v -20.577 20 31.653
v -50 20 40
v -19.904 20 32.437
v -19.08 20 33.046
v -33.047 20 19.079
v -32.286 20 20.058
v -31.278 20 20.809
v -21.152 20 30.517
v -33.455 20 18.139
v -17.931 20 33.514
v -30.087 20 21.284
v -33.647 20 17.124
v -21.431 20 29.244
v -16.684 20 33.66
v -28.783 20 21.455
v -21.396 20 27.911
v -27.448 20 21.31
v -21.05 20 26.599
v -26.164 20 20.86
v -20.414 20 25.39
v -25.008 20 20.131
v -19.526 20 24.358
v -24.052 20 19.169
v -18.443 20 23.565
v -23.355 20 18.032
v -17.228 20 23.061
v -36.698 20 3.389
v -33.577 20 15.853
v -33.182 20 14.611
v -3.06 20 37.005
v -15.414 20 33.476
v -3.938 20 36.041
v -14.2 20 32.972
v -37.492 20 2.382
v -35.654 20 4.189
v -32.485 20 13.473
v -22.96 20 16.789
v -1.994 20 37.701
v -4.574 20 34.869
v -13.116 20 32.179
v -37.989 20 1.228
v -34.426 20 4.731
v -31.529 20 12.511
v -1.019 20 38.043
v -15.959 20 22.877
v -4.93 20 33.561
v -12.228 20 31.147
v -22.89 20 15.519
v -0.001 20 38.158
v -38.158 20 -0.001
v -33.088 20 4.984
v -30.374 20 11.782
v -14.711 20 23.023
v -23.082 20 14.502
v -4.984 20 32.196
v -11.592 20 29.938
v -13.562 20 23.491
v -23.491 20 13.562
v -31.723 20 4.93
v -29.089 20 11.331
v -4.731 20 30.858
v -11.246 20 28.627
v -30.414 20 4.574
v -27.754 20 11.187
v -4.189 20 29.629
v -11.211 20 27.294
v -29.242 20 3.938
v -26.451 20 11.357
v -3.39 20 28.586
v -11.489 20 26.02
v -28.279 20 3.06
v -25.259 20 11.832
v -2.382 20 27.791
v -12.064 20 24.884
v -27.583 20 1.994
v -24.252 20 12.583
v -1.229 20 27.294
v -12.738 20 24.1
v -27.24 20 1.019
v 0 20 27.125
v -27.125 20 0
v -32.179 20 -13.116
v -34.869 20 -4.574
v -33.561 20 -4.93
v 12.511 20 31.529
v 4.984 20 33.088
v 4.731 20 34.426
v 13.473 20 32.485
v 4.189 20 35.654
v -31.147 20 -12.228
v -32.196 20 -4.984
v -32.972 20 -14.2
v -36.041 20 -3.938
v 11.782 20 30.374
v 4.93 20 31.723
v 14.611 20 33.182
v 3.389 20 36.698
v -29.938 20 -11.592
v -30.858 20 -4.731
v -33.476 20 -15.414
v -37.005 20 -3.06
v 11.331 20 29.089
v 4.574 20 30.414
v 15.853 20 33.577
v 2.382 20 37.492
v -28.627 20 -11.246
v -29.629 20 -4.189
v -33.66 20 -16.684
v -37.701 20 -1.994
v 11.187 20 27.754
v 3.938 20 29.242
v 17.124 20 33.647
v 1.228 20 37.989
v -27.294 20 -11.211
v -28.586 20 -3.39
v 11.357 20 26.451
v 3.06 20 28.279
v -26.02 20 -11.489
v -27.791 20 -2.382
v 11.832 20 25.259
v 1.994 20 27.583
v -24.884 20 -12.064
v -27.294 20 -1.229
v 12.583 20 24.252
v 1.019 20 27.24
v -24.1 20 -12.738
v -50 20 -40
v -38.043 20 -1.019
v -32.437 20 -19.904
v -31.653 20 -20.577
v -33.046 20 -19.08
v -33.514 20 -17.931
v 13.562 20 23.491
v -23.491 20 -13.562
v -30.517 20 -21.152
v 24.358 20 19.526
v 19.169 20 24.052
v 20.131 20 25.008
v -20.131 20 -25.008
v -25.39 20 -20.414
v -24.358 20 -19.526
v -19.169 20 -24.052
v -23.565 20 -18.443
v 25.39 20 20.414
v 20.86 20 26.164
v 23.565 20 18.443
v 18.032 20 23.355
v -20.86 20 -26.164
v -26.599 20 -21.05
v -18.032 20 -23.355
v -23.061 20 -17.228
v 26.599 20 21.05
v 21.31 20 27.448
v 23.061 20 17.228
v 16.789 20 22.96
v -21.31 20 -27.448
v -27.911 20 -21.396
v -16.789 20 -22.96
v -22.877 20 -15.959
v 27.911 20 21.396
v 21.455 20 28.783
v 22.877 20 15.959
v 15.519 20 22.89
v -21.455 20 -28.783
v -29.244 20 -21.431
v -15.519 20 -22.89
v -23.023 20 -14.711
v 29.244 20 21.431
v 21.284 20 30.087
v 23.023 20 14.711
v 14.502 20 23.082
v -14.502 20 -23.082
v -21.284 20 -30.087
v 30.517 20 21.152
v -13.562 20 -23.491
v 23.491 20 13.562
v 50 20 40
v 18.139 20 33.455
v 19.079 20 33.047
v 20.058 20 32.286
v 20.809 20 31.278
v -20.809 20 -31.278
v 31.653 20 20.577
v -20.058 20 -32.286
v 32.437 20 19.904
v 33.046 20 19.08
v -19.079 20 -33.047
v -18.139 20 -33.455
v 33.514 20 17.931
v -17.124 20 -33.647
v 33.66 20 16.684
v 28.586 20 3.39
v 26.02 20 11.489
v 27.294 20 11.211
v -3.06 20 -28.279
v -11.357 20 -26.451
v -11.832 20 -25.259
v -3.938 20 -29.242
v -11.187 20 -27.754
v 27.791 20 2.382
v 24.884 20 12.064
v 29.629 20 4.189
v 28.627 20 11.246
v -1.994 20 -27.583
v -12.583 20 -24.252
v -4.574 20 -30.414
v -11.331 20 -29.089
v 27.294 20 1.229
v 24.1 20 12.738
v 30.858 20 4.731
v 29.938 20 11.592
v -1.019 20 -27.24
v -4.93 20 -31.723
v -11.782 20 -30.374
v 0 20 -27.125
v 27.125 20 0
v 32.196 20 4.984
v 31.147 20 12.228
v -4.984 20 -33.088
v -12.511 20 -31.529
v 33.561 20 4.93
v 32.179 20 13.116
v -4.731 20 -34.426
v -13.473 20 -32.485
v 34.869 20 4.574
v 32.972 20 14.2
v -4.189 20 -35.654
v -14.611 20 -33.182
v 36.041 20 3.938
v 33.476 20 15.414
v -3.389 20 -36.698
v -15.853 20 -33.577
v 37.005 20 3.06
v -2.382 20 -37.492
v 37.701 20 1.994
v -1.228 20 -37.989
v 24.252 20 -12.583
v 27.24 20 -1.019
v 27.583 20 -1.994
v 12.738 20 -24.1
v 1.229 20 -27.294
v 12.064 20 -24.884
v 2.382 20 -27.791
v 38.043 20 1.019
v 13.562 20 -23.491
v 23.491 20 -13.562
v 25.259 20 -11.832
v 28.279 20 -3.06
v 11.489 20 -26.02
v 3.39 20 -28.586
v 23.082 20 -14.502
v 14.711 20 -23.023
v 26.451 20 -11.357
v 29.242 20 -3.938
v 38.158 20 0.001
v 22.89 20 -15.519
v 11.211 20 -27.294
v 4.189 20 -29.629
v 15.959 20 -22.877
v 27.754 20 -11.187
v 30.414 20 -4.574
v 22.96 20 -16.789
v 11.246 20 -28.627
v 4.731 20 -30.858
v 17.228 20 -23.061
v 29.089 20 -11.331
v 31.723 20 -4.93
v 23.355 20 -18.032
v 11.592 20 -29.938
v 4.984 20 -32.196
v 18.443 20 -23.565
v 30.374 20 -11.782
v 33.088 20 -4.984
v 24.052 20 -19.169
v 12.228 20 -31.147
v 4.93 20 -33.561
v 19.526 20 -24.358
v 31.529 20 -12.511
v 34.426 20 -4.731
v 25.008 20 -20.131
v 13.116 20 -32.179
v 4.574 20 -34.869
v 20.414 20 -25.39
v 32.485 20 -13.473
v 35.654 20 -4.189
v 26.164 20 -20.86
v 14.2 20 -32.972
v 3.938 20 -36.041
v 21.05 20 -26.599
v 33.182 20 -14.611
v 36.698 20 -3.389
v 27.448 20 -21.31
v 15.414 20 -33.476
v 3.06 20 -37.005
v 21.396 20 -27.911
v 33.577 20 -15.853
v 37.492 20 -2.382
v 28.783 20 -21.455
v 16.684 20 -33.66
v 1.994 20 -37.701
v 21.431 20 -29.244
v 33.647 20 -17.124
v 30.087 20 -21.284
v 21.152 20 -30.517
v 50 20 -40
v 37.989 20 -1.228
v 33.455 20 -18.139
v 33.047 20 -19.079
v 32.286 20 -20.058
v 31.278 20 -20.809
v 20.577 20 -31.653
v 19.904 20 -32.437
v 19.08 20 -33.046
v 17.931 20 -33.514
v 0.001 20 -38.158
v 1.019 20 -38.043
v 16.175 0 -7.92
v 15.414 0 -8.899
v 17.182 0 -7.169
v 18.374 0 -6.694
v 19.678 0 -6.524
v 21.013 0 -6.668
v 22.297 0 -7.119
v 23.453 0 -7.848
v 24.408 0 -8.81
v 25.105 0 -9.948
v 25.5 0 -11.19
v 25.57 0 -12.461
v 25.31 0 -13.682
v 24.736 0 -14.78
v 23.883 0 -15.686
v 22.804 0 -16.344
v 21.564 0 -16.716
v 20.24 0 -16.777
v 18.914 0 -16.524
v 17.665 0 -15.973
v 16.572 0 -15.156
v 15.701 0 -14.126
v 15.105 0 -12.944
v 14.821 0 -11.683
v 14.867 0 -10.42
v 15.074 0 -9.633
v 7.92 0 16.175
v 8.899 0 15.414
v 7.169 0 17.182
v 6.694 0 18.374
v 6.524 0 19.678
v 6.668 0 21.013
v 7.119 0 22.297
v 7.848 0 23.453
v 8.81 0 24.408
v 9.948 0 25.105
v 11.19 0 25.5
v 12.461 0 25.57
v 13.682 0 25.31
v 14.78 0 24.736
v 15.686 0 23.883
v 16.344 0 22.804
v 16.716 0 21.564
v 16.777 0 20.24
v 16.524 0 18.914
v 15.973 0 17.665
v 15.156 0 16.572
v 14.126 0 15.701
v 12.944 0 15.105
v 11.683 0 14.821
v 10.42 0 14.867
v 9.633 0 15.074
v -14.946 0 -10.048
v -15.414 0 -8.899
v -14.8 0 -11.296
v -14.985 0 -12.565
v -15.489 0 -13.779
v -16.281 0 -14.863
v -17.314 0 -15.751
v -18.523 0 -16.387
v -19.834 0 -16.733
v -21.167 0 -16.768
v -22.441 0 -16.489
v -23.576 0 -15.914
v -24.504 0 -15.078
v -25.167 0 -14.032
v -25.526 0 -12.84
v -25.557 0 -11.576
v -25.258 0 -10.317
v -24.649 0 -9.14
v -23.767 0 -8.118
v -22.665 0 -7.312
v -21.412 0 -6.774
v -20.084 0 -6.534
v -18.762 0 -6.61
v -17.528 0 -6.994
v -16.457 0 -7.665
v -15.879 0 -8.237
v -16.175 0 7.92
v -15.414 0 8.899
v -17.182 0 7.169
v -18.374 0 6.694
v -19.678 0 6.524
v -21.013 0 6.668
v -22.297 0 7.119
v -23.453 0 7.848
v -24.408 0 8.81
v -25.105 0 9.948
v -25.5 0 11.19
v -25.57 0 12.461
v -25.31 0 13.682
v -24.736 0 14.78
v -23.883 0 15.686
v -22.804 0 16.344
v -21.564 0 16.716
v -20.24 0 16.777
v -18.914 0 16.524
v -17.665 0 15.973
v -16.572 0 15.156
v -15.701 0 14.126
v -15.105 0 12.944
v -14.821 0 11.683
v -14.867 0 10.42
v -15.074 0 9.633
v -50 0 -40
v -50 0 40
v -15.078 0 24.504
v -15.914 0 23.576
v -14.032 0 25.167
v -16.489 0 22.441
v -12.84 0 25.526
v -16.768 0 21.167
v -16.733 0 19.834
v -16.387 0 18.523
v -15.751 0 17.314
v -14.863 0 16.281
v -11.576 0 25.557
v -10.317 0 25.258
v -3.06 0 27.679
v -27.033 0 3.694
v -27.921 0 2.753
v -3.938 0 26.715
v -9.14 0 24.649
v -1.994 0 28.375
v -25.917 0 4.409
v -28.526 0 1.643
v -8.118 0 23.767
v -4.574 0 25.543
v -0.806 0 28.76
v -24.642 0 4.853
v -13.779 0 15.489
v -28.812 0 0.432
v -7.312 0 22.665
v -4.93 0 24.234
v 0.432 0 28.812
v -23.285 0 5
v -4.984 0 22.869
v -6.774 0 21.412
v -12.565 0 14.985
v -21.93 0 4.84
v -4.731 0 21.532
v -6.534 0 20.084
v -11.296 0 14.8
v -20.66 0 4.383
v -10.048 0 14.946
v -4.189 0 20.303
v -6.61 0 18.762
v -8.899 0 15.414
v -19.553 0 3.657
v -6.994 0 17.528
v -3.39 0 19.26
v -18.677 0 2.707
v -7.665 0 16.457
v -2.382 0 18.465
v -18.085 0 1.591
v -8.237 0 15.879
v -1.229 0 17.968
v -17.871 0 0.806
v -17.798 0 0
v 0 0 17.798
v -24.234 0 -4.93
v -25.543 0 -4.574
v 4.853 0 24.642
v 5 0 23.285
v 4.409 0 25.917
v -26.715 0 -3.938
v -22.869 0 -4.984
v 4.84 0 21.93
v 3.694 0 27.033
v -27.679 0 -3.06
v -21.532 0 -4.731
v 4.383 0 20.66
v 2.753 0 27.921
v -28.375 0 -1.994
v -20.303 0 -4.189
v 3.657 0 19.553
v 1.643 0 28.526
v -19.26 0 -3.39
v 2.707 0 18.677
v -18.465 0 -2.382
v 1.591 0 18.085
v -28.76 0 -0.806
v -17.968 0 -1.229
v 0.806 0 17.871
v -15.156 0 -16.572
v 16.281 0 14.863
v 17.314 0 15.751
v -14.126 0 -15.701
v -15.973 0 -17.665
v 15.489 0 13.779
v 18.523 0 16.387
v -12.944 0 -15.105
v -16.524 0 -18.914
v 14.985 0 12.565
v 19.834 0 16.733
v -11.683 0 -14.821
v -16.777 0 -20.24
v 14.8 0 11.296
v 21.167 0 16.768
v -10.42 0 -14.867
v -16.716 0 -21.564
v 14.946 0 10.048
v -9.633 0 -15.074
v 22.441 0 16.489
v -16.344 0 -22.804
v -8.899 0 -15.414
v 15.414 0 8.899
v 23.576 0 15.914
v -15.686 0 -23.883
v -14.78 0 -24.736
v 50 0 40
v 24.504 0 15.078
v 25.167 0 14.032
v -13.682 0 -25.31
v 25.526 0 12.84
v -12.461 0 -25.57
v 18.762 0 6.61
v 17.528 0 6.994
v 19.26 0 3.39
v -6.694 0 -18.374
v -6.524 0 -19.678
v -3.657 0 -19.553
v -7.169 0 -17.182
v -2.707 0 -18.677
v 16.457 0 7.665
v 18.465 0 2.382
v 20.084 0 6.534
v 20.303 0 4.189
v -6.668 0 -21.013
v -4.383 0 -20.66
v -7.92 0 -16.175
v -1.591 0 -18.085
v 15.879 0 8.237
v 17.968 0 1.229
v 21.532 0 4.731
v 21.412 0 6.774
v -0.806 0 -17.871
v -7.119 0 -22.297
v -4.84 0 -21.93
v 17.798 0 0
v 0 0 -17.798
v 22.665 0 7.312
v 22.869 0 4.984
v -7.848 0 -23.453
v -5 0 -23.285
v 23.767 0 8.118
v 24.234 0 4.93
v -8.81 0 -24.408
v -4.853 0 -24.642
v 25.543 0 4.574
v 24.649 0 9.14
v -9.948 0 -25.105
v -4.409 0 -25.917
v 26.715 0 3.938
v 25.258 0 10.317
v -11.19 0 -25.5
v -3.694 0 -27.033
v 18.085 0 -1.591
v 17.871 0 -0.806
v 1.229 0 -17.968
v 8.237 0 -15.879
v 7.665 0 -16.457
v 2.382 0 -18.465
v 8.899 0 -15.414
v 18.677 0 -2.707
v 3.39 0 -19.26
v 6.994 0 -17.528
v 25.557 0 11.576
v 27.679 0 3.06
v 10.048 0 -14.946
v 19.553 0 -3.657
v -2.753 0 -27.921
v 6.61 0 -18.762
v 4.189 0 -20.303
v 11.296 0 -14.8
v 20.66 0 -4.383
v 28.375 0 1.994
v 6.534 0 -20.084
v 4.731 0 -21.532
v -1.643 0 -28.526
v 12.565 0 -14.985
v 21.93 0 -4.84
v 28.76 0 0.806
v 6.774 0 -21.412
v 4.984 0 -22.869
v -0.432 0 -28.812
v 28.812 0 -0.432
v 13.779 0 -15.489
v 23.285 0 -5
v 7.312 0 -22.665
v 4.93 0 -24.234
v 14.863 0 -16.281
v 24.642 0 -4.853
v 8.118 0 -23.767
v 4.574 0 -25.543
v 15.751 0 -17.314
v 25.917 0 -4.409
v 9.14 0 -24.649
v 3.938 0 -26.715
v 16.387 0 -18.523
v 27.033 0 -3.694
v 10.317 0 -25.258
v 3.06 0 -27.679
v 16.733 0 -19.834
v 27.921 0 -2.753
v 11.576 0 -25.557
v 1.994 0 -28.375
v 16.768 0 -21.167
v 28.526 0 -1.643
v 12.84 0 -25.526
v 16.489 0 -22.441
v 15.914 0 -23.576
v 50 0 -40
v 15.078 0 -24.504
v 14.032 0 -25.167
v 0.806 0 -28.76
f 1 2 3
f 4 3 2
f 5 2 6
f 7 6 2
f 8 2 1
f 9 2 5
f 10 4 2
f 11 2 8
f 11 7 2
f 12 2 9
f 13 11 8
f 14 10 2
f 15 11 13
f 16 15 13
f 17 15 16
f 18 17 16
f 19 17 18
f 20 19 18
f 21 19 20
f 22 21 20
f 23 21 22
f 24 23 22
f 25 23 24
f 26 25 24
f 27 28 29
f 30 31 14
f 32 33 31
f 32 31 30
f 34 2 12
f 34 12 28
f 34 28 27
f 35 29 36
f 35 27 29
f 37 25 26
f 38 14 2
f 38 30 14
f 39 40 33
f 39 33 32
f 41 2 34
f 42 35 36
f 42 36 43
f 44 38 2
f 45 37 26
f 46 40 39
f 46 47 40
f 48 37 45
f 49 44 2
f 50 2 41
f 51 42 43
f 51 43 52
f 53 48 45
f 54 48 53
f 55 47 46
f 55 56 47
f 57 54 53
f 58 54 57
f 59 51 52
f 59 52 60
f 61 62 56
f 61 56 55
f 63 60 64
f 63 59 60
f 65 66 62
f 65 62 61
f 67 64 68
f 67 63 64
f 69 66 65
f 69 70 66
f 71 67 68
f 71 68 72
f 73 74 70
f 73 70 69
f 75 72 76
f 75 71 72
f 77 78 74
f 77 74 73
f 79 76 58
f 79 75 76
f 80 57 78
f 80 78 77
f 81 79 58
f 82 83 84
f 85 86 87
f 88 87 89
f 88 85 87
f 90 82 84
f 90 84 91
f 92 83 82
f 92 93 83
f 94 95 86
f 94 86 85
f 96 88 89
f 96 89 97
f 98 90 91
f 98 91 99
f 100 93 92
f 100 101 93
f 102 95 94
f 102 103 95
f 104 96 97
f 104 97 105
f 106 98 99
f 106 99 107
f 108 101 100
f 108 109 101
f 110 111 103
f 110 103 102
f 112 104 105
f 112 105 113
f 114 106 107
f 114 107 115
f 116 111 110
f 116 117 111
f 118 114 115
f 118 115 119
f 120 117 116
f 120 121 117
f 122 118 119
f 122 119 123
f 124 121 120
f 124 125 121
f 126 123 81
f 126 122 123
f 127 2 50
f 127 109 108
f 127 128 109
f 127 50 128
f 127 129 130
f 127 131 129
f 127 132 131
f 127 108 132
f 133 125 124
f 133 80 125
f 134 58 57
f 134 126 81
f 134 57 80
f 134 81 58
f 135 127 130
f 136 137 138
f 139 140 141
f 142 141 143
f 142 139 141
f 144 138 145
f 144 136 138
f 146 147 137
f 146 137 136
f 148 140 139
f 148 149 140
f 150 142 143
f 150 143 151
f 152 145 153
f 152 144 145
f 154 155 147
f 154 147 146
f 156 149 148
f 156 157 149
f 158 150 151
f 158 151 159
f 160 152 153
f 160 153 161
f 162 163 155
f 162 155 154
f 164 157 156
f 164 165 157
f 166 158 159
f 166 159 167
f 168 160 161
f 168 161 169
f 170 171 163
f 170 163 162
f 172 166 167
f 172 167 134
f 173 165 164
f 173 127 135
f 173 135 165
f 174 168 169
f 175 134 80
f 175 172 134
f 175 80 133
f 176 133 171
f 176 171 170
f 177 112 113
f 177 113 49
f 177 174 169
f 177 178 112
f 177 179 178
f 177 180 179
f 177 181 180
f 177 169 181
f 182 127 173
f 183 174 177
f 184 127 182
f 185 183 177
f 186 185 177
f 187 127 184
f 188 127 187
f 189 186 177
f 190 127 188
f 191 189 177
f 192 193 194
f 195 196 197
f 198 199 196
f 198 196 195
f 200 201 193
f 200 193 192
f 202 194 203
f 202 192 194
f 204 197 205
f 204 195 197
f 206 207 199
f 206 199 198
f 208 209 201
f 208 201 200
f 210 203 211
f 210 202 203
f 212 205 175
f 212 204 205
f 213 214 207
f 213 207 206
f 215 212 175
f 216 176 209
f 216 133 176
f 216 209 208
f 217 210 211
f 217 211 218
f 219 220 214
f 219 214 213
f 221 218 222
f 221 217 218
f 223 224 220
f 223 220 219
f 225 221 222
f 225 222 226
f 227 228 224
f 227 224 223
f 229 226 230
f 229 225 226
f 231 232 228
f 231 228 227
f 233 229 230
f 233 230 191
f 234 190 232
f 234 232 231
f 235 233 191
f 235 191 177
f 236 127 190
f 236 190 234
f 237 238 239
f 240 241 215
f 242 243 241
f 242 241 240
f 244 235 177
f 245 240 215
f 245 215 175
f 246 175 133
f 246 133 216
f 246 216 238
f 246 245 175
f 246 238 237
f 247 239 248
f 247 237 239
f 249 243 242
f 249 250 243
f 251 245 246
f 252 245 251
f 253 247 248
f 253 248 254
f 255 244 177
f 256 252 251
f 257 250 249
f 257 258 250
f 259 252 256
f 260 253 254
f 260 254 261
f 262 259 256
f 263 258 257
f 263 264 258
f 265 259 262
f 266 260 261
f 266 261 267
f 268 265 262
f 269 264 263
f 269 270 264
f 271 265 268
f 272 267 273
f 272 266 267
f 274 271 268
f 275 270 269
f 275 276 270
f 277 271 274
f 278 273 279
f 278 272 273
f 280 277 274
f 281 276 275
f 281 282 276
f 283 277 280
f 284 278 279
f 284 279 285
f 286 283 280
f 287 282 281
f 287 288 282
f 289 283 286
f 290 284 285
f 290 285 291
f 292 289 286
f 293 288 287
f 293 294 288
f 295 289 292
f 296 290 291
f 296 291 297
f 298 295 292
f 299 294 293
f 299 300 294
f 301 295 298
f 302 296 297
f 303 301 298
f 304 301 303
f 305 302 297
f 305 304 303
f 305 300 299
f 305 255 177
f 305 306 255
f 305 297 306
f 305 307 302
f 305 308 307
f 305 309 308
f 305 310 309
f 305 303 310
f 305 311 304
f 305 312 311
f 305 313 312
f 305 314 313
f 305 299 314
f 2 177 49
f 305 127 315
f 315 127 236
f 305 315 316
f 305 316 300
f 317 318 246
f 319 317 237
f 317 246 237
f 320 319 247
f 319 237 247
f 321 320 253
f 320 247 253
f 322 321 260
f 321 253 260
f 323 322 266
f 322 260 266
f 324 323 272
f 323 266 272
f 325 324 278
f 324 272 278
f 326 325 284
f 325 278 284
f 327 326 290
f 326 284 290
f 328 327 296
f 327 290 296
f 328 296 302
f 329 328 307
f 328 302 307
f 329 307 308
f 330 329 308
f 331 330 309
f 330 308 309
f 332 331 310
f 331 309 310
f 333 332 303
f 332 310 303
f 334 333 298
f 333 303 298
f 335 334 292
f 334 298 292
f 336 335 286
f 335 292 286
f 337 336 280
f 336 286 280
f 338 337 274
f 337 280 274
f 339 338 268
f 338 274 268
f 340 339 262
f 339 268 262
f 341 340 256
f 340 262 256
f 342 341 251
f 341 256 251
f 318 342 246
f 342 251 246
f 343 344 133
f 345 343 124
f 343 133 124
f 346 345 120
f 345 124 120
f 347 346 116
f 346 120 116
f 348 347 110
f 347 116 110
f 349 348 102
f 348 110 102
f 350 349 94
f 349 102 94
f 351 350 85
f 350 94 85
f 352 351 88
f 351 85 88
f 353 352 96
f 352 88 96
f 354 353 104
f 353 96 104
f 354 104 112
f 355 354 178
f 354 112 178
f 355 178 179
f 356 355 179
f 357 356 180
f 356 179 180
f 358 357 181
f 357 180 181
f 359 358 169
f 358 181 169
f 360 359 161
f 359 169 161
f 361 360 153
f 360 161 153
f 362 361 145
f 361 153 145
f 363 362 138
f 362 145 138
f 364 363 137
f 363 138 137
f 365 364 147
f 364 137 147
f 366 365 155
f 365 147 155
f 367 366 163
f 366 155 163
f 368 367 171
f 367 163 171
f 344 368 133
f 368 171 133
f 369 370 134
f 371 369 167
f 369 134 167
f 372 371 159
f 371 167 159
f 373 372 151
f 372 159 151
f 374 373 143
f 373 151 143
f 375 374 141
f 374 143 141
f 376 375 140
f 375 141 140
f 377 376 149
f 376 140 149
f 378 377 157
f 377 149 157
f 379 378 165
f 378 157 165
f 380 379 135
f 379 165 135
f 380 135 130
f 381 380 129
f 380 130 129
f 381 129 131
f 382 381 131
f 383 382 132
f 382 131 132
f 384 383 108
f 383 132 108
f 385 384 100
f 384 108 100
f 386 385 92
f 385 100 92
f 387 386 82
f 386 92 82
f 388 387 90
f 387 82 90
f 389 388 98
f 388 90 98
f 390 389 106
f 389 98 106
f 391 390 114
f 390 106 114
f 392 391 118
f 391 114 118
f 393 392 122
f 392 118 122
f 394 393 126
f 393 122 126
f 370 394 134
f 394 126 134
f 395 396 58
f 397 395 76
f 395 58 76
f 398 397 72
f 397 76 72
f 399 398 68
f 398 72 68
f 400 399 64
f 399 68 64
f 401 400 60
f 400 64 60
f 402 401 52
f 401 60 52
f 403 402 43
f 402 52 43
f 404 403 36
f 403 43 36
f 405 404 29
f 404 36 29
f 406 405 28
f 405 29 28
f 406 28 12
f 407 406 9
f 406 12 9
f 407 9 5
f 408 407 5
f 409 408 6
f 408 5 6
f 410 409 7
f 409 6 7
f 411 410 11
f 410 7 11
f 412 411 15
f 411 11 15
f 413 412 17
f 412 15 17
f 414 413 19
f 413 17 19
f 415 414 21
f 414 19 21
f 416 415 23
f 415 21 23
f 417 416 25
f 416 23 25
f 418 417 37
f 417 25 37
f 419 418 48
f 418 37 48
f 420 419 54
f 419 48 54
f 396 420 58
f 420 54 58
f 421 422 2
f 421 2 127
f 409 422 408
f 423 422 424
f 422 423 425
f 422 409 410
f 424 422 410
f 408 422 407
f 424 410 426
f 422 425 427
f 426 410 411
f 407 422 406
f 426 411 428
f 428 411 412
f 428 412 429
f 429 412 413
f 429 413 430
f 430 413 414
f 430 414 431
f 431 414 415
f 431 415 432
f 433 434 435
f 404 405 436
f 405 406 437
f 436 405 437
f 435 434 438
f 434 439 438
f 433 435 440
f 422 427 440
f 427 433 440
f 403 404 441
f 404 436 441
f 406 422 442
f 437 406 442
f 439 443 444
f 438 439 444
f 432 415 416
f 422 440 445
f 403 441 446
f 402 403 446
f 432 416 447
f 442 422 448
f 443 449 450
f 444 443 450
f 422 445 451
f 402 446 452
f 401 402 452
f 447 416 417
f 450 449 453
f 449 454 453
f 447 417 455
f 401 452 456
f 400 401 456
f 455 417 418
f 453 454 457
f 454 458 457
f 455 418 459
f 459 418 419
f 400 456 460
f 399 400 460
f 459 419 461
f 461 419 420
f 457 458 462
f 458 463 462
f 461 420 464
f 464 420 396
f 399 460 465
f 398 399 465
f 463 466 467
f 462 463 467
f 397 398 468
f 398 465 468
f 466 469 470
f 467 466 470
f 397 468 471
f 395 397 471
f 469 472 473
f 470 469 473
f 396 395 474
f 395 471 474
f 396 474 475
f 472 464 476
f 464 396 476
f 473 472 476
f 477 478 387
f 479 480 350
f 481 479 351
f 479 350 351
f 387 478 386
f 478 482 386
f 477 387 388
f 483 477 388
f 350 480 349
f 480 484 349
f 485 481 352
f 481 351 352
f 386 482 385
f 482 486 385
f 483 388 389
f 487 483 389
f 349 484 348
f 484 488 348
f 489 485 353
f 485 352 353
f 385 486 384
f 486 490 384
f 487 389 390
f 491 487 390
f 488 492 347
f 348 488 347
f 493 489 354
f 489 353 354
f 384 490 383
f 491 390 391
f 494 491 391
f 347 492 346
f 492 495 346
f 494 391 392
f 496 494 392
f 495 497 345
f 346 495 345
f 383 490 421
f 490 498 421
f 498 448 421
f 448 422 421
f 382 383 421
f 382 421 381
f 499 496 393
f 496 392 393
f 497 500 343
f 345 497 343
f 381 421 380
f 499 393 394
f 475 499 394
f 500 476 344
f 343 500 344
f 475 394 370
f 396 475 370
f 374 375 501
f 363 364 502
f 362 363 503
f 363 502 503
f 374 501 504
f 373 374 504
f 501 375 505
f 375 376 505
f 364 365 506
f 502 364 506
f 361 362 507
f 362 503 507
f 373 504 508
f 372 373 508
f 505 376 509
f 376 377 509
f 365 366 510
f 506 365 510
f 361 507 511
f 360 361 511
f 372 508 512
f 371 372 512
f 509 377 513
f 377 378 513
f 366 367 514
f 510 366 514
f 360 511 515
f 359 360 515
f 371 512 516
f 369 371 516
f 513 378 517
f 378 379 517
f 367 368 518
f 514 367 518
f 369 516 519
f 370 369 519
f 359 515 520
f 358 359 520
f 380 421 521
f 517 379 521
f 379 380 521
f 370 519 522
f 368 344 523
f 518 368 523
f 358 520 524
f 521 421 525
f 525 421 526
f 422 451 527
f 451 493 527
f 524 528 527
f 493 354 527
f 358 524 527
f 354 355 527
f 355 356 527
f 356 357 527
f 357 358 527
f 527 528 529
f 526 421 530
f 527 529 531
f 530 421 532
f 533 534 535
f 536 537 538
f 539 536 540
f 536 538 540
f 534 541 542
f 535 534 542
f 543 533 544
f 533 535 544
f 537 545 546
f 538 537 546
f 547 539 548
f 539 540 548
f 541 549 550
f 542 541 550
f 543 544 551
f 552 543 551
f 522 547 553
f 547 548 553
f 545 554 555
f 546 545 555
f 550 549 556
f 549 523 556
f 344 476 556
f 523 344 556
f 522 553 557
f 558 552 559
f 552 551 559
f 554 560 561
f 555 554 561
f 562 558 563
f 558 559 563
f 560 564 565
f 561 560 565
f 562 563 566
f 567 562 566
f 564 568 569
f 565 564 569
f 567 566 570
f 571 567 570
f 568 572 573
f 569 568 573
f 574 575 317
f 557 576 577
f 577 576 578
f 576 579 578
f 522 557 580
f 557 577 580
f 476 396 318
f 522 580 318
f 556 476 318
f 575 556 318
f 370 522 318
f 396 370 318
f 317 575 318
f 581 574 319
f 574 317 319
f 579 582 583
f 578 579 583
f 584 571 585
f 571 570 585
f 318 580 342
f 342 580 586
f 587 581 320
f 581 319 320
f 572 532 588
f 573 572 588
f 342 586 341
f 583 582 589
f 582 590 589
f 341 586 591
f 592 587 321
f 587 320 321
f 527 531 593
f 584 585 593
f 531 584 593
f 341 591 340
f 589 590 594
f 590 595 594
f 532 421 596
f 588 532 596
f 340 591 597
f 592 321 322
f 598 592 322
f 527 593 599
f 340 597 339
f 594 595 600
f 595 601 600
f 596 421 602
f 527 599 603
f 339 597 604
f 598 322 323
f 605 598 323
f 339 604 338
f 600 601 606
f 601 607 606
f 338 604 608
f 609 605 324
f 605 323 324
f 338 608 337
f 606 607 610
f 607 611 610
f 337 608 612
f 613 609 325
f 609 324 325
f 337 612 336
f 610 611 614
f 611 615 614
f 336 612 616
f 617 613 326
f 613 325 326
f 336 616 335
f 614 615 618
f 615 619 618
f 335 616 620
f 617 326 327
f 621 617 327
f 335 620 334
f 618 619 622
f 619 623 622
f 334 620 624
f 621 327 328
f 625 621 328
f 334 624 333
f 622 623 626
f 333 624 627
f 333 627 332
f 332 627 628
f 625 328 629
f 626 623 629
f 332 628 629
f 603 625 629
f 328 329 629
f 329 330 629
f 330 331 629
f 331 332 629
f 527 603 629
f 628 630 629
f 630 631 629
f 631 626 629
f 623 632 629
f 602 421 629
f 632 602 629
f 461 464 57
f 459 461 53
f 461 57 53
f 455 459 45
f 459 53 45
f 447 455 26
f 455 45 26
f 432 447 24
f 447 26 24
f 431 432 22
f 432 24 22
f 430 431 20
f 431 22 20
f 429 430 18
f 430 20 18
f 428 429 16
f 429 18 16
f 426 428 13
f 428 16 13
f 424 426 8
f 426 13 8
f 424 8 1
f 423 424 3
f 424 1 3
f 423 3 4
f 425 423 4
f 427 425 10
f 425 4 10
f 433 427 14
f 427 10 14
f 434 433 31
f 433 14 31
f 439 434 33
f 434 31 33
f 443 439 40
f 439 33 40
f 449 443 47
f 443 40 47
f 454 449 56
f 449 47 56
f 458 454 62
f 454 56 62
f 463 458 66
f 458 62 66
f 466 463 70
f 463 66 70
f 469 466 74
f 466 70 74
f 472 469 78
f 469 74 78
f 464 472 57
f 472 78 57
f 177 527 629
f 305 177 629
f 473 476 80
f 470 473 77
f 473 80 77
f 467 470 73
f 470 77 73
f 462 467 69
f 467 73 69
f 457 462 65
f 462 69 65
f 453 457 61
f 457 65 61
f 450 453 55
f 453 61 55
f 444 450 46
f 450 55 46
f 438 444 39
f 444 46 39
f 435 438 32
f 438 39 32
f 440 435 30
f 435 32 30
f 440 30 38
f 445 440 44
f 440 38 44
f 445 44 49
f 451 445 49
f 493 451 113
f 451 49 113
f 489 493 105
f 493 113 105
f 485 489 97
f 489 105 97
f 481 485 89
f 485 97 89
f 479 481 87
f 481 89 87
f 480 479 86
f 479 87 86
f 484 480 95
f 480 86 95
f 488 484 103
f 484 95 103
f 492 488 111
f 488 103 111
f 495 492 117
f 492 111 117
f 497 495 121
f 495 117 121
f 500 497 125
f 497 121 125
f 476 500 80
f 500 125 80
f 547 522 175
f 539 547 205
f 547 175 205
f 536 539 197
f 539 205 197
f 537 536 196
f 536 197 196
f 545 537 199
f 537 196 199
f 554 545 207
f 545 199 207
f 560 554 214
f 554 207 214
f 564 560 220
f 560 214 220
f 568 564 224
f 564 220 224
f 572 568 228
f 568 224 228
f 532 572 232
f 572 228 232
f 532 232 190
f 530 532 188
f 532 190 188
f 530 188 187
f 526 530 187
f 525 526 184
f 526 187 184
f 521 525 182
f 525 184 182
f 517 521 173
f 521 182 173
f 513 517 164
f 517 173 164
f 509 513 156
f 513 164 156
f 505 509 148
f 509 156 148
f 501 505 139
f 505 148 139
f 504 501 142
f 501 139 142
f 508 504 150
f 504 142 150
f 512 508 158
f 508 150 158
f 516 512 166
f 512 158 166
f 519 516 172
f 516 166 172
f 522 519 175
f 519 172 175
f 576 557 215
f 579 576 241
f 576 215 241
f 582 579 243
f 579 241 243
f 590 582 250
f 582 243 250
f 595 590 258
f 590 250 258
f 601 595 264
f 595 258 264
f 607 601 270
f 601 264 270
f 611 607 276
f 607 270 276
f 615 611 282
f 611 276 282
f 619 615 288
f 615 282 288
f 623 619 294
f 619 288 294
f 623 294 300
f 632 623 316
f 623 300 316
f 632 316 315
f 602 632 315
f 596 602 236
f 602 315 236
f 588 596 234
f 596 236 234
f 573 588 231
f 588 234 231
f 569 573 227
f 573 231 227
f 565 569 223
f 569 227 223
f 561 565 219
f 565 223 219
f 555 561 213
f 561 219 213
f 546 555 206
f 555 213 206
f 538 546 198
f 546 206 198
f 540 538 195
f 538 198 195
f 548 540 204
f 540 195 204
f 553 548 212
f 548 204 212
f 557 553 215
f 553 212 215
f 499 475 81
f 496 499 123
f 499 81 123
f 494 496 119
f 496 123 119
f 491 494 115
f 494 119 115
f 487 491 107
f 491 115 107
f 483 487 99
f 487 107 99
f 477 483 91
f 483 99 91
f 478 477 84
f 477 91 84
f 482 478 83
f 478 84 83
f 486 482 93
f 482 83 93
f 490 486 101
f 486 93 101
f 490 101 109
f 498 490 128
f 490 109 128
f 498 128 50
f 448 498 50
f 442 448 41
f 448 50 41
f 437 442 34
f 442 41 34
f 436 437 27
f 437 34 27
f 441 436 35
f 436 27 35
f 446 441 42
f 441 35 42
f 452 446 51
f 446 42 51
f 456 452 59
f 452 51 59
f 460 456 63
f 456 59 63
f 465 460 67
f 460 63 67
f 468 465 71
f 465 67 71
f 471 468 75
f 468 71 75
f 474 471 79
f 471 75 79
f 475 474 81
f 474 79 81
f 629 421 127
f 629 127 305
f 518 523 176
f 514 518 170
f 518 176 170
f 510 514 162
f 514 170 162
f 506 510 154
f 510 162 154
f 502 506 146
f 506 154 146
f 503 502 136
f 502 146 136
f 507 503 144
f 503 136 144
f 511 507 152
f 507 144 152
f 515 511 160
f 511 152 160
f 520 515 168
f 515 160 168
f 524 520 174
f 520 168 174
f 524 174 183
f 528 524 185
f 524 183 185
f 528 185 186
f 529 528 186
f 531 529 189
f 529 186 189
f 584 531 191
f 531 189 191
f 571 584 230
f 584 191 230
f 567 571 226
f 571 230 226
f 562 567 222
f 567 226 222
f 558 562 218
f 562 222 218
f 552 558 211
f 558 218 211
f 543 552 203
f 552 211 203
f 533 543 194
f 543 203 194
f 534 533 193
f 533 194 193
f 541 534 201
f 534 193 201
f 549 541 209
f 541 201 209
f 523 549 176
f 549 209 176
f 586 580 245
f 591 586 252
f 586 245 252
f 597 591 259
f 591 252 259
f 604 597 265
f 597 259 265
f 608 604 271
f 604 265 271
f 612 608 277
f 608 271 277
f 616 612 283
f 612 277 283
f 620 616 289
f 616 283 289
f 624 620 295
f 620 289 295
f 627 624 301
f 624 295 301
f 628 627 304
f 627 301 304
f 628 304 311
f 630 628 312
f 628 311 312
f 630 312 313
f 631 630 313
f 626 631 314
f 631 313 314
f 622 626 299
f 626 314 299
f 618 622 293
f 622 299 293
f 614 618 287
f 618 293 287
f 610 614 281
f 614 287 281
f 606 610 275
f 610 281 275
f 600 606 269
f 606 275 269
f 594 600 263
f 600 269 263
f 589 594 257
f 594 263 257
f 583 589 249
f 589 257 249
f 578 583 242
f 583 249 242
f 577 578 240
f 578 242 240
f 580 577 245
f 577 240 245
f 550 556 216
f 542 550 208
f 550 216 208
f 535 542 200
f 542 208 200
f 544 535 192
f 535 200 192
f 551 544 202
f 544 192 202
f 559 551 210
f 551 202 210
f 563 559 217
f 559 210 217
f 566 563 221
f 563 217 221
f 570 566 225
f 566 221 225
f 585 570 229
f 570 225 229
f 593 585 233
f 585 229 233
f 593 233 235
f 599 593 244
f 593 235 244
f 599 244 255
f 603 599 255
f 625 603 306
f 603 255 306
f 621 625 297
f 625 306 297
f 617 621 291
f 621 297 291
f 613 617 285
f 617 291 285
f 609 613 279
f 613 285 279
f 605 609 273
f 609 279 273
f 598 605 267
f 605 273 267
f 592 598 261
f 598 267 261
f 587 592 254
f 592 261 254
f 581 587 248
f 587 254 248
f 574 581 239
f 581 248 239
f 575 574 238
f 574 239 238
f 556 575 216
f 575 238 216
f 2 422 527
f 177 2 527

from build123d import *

# Parameters (mm, degrees)
SKIZZE1_W                       = 100
SKIZZE1_H                       = 80
AUFSATZ_LINEAR_AUSTRAGEN1_DEPTH = 20
KREISMUSTER1_COUNT              = 12


with BuildPart() as part:
    # Skizze1 → Aufsatz-Linear austragen1 (new body)
    with BuildSketch(Plane(origin=(0, 0, 0), x_dir=(1, 0, 0), z_dir=(0, 1, 0))):
        Rectangle(SKIZZE1_W, SKIZZE1_H)
    extrude(amount=AUFSATZ_LINEAR_AUSTRAGEN1_DEPTH)

    # Skizze2 → Schnitt-Rotation1 (revolve, cut)
    with BuildSketch(Plane.XY):
        Polygon((-33.62688673, 22.113091309), (-22.330032248, -2.113091309), (-17.798493313, 0), (-29.095347795, 24.226182617), align=None)
    schnitt_rotation1 = revolve(axis=Axis((0, -50, 0), (-0.422618262, 0.906307787, 0)), mode=Mode.SUBTRACT)

    # Kreismuster1: Schnitt-Rotation1 ×12 about axis
    kreismuster1_axis = Axis((0, 0, 0), (0, 1, 0))
    for i in range(1, KREISMUSTER1_COUNT):
        add(schnitt_rotation1.rotate(kreismuster1_axis, i * 360 / KREISMUSTER1_COUNT), mode=Mode.SUBTRACT)


solid = part.part
